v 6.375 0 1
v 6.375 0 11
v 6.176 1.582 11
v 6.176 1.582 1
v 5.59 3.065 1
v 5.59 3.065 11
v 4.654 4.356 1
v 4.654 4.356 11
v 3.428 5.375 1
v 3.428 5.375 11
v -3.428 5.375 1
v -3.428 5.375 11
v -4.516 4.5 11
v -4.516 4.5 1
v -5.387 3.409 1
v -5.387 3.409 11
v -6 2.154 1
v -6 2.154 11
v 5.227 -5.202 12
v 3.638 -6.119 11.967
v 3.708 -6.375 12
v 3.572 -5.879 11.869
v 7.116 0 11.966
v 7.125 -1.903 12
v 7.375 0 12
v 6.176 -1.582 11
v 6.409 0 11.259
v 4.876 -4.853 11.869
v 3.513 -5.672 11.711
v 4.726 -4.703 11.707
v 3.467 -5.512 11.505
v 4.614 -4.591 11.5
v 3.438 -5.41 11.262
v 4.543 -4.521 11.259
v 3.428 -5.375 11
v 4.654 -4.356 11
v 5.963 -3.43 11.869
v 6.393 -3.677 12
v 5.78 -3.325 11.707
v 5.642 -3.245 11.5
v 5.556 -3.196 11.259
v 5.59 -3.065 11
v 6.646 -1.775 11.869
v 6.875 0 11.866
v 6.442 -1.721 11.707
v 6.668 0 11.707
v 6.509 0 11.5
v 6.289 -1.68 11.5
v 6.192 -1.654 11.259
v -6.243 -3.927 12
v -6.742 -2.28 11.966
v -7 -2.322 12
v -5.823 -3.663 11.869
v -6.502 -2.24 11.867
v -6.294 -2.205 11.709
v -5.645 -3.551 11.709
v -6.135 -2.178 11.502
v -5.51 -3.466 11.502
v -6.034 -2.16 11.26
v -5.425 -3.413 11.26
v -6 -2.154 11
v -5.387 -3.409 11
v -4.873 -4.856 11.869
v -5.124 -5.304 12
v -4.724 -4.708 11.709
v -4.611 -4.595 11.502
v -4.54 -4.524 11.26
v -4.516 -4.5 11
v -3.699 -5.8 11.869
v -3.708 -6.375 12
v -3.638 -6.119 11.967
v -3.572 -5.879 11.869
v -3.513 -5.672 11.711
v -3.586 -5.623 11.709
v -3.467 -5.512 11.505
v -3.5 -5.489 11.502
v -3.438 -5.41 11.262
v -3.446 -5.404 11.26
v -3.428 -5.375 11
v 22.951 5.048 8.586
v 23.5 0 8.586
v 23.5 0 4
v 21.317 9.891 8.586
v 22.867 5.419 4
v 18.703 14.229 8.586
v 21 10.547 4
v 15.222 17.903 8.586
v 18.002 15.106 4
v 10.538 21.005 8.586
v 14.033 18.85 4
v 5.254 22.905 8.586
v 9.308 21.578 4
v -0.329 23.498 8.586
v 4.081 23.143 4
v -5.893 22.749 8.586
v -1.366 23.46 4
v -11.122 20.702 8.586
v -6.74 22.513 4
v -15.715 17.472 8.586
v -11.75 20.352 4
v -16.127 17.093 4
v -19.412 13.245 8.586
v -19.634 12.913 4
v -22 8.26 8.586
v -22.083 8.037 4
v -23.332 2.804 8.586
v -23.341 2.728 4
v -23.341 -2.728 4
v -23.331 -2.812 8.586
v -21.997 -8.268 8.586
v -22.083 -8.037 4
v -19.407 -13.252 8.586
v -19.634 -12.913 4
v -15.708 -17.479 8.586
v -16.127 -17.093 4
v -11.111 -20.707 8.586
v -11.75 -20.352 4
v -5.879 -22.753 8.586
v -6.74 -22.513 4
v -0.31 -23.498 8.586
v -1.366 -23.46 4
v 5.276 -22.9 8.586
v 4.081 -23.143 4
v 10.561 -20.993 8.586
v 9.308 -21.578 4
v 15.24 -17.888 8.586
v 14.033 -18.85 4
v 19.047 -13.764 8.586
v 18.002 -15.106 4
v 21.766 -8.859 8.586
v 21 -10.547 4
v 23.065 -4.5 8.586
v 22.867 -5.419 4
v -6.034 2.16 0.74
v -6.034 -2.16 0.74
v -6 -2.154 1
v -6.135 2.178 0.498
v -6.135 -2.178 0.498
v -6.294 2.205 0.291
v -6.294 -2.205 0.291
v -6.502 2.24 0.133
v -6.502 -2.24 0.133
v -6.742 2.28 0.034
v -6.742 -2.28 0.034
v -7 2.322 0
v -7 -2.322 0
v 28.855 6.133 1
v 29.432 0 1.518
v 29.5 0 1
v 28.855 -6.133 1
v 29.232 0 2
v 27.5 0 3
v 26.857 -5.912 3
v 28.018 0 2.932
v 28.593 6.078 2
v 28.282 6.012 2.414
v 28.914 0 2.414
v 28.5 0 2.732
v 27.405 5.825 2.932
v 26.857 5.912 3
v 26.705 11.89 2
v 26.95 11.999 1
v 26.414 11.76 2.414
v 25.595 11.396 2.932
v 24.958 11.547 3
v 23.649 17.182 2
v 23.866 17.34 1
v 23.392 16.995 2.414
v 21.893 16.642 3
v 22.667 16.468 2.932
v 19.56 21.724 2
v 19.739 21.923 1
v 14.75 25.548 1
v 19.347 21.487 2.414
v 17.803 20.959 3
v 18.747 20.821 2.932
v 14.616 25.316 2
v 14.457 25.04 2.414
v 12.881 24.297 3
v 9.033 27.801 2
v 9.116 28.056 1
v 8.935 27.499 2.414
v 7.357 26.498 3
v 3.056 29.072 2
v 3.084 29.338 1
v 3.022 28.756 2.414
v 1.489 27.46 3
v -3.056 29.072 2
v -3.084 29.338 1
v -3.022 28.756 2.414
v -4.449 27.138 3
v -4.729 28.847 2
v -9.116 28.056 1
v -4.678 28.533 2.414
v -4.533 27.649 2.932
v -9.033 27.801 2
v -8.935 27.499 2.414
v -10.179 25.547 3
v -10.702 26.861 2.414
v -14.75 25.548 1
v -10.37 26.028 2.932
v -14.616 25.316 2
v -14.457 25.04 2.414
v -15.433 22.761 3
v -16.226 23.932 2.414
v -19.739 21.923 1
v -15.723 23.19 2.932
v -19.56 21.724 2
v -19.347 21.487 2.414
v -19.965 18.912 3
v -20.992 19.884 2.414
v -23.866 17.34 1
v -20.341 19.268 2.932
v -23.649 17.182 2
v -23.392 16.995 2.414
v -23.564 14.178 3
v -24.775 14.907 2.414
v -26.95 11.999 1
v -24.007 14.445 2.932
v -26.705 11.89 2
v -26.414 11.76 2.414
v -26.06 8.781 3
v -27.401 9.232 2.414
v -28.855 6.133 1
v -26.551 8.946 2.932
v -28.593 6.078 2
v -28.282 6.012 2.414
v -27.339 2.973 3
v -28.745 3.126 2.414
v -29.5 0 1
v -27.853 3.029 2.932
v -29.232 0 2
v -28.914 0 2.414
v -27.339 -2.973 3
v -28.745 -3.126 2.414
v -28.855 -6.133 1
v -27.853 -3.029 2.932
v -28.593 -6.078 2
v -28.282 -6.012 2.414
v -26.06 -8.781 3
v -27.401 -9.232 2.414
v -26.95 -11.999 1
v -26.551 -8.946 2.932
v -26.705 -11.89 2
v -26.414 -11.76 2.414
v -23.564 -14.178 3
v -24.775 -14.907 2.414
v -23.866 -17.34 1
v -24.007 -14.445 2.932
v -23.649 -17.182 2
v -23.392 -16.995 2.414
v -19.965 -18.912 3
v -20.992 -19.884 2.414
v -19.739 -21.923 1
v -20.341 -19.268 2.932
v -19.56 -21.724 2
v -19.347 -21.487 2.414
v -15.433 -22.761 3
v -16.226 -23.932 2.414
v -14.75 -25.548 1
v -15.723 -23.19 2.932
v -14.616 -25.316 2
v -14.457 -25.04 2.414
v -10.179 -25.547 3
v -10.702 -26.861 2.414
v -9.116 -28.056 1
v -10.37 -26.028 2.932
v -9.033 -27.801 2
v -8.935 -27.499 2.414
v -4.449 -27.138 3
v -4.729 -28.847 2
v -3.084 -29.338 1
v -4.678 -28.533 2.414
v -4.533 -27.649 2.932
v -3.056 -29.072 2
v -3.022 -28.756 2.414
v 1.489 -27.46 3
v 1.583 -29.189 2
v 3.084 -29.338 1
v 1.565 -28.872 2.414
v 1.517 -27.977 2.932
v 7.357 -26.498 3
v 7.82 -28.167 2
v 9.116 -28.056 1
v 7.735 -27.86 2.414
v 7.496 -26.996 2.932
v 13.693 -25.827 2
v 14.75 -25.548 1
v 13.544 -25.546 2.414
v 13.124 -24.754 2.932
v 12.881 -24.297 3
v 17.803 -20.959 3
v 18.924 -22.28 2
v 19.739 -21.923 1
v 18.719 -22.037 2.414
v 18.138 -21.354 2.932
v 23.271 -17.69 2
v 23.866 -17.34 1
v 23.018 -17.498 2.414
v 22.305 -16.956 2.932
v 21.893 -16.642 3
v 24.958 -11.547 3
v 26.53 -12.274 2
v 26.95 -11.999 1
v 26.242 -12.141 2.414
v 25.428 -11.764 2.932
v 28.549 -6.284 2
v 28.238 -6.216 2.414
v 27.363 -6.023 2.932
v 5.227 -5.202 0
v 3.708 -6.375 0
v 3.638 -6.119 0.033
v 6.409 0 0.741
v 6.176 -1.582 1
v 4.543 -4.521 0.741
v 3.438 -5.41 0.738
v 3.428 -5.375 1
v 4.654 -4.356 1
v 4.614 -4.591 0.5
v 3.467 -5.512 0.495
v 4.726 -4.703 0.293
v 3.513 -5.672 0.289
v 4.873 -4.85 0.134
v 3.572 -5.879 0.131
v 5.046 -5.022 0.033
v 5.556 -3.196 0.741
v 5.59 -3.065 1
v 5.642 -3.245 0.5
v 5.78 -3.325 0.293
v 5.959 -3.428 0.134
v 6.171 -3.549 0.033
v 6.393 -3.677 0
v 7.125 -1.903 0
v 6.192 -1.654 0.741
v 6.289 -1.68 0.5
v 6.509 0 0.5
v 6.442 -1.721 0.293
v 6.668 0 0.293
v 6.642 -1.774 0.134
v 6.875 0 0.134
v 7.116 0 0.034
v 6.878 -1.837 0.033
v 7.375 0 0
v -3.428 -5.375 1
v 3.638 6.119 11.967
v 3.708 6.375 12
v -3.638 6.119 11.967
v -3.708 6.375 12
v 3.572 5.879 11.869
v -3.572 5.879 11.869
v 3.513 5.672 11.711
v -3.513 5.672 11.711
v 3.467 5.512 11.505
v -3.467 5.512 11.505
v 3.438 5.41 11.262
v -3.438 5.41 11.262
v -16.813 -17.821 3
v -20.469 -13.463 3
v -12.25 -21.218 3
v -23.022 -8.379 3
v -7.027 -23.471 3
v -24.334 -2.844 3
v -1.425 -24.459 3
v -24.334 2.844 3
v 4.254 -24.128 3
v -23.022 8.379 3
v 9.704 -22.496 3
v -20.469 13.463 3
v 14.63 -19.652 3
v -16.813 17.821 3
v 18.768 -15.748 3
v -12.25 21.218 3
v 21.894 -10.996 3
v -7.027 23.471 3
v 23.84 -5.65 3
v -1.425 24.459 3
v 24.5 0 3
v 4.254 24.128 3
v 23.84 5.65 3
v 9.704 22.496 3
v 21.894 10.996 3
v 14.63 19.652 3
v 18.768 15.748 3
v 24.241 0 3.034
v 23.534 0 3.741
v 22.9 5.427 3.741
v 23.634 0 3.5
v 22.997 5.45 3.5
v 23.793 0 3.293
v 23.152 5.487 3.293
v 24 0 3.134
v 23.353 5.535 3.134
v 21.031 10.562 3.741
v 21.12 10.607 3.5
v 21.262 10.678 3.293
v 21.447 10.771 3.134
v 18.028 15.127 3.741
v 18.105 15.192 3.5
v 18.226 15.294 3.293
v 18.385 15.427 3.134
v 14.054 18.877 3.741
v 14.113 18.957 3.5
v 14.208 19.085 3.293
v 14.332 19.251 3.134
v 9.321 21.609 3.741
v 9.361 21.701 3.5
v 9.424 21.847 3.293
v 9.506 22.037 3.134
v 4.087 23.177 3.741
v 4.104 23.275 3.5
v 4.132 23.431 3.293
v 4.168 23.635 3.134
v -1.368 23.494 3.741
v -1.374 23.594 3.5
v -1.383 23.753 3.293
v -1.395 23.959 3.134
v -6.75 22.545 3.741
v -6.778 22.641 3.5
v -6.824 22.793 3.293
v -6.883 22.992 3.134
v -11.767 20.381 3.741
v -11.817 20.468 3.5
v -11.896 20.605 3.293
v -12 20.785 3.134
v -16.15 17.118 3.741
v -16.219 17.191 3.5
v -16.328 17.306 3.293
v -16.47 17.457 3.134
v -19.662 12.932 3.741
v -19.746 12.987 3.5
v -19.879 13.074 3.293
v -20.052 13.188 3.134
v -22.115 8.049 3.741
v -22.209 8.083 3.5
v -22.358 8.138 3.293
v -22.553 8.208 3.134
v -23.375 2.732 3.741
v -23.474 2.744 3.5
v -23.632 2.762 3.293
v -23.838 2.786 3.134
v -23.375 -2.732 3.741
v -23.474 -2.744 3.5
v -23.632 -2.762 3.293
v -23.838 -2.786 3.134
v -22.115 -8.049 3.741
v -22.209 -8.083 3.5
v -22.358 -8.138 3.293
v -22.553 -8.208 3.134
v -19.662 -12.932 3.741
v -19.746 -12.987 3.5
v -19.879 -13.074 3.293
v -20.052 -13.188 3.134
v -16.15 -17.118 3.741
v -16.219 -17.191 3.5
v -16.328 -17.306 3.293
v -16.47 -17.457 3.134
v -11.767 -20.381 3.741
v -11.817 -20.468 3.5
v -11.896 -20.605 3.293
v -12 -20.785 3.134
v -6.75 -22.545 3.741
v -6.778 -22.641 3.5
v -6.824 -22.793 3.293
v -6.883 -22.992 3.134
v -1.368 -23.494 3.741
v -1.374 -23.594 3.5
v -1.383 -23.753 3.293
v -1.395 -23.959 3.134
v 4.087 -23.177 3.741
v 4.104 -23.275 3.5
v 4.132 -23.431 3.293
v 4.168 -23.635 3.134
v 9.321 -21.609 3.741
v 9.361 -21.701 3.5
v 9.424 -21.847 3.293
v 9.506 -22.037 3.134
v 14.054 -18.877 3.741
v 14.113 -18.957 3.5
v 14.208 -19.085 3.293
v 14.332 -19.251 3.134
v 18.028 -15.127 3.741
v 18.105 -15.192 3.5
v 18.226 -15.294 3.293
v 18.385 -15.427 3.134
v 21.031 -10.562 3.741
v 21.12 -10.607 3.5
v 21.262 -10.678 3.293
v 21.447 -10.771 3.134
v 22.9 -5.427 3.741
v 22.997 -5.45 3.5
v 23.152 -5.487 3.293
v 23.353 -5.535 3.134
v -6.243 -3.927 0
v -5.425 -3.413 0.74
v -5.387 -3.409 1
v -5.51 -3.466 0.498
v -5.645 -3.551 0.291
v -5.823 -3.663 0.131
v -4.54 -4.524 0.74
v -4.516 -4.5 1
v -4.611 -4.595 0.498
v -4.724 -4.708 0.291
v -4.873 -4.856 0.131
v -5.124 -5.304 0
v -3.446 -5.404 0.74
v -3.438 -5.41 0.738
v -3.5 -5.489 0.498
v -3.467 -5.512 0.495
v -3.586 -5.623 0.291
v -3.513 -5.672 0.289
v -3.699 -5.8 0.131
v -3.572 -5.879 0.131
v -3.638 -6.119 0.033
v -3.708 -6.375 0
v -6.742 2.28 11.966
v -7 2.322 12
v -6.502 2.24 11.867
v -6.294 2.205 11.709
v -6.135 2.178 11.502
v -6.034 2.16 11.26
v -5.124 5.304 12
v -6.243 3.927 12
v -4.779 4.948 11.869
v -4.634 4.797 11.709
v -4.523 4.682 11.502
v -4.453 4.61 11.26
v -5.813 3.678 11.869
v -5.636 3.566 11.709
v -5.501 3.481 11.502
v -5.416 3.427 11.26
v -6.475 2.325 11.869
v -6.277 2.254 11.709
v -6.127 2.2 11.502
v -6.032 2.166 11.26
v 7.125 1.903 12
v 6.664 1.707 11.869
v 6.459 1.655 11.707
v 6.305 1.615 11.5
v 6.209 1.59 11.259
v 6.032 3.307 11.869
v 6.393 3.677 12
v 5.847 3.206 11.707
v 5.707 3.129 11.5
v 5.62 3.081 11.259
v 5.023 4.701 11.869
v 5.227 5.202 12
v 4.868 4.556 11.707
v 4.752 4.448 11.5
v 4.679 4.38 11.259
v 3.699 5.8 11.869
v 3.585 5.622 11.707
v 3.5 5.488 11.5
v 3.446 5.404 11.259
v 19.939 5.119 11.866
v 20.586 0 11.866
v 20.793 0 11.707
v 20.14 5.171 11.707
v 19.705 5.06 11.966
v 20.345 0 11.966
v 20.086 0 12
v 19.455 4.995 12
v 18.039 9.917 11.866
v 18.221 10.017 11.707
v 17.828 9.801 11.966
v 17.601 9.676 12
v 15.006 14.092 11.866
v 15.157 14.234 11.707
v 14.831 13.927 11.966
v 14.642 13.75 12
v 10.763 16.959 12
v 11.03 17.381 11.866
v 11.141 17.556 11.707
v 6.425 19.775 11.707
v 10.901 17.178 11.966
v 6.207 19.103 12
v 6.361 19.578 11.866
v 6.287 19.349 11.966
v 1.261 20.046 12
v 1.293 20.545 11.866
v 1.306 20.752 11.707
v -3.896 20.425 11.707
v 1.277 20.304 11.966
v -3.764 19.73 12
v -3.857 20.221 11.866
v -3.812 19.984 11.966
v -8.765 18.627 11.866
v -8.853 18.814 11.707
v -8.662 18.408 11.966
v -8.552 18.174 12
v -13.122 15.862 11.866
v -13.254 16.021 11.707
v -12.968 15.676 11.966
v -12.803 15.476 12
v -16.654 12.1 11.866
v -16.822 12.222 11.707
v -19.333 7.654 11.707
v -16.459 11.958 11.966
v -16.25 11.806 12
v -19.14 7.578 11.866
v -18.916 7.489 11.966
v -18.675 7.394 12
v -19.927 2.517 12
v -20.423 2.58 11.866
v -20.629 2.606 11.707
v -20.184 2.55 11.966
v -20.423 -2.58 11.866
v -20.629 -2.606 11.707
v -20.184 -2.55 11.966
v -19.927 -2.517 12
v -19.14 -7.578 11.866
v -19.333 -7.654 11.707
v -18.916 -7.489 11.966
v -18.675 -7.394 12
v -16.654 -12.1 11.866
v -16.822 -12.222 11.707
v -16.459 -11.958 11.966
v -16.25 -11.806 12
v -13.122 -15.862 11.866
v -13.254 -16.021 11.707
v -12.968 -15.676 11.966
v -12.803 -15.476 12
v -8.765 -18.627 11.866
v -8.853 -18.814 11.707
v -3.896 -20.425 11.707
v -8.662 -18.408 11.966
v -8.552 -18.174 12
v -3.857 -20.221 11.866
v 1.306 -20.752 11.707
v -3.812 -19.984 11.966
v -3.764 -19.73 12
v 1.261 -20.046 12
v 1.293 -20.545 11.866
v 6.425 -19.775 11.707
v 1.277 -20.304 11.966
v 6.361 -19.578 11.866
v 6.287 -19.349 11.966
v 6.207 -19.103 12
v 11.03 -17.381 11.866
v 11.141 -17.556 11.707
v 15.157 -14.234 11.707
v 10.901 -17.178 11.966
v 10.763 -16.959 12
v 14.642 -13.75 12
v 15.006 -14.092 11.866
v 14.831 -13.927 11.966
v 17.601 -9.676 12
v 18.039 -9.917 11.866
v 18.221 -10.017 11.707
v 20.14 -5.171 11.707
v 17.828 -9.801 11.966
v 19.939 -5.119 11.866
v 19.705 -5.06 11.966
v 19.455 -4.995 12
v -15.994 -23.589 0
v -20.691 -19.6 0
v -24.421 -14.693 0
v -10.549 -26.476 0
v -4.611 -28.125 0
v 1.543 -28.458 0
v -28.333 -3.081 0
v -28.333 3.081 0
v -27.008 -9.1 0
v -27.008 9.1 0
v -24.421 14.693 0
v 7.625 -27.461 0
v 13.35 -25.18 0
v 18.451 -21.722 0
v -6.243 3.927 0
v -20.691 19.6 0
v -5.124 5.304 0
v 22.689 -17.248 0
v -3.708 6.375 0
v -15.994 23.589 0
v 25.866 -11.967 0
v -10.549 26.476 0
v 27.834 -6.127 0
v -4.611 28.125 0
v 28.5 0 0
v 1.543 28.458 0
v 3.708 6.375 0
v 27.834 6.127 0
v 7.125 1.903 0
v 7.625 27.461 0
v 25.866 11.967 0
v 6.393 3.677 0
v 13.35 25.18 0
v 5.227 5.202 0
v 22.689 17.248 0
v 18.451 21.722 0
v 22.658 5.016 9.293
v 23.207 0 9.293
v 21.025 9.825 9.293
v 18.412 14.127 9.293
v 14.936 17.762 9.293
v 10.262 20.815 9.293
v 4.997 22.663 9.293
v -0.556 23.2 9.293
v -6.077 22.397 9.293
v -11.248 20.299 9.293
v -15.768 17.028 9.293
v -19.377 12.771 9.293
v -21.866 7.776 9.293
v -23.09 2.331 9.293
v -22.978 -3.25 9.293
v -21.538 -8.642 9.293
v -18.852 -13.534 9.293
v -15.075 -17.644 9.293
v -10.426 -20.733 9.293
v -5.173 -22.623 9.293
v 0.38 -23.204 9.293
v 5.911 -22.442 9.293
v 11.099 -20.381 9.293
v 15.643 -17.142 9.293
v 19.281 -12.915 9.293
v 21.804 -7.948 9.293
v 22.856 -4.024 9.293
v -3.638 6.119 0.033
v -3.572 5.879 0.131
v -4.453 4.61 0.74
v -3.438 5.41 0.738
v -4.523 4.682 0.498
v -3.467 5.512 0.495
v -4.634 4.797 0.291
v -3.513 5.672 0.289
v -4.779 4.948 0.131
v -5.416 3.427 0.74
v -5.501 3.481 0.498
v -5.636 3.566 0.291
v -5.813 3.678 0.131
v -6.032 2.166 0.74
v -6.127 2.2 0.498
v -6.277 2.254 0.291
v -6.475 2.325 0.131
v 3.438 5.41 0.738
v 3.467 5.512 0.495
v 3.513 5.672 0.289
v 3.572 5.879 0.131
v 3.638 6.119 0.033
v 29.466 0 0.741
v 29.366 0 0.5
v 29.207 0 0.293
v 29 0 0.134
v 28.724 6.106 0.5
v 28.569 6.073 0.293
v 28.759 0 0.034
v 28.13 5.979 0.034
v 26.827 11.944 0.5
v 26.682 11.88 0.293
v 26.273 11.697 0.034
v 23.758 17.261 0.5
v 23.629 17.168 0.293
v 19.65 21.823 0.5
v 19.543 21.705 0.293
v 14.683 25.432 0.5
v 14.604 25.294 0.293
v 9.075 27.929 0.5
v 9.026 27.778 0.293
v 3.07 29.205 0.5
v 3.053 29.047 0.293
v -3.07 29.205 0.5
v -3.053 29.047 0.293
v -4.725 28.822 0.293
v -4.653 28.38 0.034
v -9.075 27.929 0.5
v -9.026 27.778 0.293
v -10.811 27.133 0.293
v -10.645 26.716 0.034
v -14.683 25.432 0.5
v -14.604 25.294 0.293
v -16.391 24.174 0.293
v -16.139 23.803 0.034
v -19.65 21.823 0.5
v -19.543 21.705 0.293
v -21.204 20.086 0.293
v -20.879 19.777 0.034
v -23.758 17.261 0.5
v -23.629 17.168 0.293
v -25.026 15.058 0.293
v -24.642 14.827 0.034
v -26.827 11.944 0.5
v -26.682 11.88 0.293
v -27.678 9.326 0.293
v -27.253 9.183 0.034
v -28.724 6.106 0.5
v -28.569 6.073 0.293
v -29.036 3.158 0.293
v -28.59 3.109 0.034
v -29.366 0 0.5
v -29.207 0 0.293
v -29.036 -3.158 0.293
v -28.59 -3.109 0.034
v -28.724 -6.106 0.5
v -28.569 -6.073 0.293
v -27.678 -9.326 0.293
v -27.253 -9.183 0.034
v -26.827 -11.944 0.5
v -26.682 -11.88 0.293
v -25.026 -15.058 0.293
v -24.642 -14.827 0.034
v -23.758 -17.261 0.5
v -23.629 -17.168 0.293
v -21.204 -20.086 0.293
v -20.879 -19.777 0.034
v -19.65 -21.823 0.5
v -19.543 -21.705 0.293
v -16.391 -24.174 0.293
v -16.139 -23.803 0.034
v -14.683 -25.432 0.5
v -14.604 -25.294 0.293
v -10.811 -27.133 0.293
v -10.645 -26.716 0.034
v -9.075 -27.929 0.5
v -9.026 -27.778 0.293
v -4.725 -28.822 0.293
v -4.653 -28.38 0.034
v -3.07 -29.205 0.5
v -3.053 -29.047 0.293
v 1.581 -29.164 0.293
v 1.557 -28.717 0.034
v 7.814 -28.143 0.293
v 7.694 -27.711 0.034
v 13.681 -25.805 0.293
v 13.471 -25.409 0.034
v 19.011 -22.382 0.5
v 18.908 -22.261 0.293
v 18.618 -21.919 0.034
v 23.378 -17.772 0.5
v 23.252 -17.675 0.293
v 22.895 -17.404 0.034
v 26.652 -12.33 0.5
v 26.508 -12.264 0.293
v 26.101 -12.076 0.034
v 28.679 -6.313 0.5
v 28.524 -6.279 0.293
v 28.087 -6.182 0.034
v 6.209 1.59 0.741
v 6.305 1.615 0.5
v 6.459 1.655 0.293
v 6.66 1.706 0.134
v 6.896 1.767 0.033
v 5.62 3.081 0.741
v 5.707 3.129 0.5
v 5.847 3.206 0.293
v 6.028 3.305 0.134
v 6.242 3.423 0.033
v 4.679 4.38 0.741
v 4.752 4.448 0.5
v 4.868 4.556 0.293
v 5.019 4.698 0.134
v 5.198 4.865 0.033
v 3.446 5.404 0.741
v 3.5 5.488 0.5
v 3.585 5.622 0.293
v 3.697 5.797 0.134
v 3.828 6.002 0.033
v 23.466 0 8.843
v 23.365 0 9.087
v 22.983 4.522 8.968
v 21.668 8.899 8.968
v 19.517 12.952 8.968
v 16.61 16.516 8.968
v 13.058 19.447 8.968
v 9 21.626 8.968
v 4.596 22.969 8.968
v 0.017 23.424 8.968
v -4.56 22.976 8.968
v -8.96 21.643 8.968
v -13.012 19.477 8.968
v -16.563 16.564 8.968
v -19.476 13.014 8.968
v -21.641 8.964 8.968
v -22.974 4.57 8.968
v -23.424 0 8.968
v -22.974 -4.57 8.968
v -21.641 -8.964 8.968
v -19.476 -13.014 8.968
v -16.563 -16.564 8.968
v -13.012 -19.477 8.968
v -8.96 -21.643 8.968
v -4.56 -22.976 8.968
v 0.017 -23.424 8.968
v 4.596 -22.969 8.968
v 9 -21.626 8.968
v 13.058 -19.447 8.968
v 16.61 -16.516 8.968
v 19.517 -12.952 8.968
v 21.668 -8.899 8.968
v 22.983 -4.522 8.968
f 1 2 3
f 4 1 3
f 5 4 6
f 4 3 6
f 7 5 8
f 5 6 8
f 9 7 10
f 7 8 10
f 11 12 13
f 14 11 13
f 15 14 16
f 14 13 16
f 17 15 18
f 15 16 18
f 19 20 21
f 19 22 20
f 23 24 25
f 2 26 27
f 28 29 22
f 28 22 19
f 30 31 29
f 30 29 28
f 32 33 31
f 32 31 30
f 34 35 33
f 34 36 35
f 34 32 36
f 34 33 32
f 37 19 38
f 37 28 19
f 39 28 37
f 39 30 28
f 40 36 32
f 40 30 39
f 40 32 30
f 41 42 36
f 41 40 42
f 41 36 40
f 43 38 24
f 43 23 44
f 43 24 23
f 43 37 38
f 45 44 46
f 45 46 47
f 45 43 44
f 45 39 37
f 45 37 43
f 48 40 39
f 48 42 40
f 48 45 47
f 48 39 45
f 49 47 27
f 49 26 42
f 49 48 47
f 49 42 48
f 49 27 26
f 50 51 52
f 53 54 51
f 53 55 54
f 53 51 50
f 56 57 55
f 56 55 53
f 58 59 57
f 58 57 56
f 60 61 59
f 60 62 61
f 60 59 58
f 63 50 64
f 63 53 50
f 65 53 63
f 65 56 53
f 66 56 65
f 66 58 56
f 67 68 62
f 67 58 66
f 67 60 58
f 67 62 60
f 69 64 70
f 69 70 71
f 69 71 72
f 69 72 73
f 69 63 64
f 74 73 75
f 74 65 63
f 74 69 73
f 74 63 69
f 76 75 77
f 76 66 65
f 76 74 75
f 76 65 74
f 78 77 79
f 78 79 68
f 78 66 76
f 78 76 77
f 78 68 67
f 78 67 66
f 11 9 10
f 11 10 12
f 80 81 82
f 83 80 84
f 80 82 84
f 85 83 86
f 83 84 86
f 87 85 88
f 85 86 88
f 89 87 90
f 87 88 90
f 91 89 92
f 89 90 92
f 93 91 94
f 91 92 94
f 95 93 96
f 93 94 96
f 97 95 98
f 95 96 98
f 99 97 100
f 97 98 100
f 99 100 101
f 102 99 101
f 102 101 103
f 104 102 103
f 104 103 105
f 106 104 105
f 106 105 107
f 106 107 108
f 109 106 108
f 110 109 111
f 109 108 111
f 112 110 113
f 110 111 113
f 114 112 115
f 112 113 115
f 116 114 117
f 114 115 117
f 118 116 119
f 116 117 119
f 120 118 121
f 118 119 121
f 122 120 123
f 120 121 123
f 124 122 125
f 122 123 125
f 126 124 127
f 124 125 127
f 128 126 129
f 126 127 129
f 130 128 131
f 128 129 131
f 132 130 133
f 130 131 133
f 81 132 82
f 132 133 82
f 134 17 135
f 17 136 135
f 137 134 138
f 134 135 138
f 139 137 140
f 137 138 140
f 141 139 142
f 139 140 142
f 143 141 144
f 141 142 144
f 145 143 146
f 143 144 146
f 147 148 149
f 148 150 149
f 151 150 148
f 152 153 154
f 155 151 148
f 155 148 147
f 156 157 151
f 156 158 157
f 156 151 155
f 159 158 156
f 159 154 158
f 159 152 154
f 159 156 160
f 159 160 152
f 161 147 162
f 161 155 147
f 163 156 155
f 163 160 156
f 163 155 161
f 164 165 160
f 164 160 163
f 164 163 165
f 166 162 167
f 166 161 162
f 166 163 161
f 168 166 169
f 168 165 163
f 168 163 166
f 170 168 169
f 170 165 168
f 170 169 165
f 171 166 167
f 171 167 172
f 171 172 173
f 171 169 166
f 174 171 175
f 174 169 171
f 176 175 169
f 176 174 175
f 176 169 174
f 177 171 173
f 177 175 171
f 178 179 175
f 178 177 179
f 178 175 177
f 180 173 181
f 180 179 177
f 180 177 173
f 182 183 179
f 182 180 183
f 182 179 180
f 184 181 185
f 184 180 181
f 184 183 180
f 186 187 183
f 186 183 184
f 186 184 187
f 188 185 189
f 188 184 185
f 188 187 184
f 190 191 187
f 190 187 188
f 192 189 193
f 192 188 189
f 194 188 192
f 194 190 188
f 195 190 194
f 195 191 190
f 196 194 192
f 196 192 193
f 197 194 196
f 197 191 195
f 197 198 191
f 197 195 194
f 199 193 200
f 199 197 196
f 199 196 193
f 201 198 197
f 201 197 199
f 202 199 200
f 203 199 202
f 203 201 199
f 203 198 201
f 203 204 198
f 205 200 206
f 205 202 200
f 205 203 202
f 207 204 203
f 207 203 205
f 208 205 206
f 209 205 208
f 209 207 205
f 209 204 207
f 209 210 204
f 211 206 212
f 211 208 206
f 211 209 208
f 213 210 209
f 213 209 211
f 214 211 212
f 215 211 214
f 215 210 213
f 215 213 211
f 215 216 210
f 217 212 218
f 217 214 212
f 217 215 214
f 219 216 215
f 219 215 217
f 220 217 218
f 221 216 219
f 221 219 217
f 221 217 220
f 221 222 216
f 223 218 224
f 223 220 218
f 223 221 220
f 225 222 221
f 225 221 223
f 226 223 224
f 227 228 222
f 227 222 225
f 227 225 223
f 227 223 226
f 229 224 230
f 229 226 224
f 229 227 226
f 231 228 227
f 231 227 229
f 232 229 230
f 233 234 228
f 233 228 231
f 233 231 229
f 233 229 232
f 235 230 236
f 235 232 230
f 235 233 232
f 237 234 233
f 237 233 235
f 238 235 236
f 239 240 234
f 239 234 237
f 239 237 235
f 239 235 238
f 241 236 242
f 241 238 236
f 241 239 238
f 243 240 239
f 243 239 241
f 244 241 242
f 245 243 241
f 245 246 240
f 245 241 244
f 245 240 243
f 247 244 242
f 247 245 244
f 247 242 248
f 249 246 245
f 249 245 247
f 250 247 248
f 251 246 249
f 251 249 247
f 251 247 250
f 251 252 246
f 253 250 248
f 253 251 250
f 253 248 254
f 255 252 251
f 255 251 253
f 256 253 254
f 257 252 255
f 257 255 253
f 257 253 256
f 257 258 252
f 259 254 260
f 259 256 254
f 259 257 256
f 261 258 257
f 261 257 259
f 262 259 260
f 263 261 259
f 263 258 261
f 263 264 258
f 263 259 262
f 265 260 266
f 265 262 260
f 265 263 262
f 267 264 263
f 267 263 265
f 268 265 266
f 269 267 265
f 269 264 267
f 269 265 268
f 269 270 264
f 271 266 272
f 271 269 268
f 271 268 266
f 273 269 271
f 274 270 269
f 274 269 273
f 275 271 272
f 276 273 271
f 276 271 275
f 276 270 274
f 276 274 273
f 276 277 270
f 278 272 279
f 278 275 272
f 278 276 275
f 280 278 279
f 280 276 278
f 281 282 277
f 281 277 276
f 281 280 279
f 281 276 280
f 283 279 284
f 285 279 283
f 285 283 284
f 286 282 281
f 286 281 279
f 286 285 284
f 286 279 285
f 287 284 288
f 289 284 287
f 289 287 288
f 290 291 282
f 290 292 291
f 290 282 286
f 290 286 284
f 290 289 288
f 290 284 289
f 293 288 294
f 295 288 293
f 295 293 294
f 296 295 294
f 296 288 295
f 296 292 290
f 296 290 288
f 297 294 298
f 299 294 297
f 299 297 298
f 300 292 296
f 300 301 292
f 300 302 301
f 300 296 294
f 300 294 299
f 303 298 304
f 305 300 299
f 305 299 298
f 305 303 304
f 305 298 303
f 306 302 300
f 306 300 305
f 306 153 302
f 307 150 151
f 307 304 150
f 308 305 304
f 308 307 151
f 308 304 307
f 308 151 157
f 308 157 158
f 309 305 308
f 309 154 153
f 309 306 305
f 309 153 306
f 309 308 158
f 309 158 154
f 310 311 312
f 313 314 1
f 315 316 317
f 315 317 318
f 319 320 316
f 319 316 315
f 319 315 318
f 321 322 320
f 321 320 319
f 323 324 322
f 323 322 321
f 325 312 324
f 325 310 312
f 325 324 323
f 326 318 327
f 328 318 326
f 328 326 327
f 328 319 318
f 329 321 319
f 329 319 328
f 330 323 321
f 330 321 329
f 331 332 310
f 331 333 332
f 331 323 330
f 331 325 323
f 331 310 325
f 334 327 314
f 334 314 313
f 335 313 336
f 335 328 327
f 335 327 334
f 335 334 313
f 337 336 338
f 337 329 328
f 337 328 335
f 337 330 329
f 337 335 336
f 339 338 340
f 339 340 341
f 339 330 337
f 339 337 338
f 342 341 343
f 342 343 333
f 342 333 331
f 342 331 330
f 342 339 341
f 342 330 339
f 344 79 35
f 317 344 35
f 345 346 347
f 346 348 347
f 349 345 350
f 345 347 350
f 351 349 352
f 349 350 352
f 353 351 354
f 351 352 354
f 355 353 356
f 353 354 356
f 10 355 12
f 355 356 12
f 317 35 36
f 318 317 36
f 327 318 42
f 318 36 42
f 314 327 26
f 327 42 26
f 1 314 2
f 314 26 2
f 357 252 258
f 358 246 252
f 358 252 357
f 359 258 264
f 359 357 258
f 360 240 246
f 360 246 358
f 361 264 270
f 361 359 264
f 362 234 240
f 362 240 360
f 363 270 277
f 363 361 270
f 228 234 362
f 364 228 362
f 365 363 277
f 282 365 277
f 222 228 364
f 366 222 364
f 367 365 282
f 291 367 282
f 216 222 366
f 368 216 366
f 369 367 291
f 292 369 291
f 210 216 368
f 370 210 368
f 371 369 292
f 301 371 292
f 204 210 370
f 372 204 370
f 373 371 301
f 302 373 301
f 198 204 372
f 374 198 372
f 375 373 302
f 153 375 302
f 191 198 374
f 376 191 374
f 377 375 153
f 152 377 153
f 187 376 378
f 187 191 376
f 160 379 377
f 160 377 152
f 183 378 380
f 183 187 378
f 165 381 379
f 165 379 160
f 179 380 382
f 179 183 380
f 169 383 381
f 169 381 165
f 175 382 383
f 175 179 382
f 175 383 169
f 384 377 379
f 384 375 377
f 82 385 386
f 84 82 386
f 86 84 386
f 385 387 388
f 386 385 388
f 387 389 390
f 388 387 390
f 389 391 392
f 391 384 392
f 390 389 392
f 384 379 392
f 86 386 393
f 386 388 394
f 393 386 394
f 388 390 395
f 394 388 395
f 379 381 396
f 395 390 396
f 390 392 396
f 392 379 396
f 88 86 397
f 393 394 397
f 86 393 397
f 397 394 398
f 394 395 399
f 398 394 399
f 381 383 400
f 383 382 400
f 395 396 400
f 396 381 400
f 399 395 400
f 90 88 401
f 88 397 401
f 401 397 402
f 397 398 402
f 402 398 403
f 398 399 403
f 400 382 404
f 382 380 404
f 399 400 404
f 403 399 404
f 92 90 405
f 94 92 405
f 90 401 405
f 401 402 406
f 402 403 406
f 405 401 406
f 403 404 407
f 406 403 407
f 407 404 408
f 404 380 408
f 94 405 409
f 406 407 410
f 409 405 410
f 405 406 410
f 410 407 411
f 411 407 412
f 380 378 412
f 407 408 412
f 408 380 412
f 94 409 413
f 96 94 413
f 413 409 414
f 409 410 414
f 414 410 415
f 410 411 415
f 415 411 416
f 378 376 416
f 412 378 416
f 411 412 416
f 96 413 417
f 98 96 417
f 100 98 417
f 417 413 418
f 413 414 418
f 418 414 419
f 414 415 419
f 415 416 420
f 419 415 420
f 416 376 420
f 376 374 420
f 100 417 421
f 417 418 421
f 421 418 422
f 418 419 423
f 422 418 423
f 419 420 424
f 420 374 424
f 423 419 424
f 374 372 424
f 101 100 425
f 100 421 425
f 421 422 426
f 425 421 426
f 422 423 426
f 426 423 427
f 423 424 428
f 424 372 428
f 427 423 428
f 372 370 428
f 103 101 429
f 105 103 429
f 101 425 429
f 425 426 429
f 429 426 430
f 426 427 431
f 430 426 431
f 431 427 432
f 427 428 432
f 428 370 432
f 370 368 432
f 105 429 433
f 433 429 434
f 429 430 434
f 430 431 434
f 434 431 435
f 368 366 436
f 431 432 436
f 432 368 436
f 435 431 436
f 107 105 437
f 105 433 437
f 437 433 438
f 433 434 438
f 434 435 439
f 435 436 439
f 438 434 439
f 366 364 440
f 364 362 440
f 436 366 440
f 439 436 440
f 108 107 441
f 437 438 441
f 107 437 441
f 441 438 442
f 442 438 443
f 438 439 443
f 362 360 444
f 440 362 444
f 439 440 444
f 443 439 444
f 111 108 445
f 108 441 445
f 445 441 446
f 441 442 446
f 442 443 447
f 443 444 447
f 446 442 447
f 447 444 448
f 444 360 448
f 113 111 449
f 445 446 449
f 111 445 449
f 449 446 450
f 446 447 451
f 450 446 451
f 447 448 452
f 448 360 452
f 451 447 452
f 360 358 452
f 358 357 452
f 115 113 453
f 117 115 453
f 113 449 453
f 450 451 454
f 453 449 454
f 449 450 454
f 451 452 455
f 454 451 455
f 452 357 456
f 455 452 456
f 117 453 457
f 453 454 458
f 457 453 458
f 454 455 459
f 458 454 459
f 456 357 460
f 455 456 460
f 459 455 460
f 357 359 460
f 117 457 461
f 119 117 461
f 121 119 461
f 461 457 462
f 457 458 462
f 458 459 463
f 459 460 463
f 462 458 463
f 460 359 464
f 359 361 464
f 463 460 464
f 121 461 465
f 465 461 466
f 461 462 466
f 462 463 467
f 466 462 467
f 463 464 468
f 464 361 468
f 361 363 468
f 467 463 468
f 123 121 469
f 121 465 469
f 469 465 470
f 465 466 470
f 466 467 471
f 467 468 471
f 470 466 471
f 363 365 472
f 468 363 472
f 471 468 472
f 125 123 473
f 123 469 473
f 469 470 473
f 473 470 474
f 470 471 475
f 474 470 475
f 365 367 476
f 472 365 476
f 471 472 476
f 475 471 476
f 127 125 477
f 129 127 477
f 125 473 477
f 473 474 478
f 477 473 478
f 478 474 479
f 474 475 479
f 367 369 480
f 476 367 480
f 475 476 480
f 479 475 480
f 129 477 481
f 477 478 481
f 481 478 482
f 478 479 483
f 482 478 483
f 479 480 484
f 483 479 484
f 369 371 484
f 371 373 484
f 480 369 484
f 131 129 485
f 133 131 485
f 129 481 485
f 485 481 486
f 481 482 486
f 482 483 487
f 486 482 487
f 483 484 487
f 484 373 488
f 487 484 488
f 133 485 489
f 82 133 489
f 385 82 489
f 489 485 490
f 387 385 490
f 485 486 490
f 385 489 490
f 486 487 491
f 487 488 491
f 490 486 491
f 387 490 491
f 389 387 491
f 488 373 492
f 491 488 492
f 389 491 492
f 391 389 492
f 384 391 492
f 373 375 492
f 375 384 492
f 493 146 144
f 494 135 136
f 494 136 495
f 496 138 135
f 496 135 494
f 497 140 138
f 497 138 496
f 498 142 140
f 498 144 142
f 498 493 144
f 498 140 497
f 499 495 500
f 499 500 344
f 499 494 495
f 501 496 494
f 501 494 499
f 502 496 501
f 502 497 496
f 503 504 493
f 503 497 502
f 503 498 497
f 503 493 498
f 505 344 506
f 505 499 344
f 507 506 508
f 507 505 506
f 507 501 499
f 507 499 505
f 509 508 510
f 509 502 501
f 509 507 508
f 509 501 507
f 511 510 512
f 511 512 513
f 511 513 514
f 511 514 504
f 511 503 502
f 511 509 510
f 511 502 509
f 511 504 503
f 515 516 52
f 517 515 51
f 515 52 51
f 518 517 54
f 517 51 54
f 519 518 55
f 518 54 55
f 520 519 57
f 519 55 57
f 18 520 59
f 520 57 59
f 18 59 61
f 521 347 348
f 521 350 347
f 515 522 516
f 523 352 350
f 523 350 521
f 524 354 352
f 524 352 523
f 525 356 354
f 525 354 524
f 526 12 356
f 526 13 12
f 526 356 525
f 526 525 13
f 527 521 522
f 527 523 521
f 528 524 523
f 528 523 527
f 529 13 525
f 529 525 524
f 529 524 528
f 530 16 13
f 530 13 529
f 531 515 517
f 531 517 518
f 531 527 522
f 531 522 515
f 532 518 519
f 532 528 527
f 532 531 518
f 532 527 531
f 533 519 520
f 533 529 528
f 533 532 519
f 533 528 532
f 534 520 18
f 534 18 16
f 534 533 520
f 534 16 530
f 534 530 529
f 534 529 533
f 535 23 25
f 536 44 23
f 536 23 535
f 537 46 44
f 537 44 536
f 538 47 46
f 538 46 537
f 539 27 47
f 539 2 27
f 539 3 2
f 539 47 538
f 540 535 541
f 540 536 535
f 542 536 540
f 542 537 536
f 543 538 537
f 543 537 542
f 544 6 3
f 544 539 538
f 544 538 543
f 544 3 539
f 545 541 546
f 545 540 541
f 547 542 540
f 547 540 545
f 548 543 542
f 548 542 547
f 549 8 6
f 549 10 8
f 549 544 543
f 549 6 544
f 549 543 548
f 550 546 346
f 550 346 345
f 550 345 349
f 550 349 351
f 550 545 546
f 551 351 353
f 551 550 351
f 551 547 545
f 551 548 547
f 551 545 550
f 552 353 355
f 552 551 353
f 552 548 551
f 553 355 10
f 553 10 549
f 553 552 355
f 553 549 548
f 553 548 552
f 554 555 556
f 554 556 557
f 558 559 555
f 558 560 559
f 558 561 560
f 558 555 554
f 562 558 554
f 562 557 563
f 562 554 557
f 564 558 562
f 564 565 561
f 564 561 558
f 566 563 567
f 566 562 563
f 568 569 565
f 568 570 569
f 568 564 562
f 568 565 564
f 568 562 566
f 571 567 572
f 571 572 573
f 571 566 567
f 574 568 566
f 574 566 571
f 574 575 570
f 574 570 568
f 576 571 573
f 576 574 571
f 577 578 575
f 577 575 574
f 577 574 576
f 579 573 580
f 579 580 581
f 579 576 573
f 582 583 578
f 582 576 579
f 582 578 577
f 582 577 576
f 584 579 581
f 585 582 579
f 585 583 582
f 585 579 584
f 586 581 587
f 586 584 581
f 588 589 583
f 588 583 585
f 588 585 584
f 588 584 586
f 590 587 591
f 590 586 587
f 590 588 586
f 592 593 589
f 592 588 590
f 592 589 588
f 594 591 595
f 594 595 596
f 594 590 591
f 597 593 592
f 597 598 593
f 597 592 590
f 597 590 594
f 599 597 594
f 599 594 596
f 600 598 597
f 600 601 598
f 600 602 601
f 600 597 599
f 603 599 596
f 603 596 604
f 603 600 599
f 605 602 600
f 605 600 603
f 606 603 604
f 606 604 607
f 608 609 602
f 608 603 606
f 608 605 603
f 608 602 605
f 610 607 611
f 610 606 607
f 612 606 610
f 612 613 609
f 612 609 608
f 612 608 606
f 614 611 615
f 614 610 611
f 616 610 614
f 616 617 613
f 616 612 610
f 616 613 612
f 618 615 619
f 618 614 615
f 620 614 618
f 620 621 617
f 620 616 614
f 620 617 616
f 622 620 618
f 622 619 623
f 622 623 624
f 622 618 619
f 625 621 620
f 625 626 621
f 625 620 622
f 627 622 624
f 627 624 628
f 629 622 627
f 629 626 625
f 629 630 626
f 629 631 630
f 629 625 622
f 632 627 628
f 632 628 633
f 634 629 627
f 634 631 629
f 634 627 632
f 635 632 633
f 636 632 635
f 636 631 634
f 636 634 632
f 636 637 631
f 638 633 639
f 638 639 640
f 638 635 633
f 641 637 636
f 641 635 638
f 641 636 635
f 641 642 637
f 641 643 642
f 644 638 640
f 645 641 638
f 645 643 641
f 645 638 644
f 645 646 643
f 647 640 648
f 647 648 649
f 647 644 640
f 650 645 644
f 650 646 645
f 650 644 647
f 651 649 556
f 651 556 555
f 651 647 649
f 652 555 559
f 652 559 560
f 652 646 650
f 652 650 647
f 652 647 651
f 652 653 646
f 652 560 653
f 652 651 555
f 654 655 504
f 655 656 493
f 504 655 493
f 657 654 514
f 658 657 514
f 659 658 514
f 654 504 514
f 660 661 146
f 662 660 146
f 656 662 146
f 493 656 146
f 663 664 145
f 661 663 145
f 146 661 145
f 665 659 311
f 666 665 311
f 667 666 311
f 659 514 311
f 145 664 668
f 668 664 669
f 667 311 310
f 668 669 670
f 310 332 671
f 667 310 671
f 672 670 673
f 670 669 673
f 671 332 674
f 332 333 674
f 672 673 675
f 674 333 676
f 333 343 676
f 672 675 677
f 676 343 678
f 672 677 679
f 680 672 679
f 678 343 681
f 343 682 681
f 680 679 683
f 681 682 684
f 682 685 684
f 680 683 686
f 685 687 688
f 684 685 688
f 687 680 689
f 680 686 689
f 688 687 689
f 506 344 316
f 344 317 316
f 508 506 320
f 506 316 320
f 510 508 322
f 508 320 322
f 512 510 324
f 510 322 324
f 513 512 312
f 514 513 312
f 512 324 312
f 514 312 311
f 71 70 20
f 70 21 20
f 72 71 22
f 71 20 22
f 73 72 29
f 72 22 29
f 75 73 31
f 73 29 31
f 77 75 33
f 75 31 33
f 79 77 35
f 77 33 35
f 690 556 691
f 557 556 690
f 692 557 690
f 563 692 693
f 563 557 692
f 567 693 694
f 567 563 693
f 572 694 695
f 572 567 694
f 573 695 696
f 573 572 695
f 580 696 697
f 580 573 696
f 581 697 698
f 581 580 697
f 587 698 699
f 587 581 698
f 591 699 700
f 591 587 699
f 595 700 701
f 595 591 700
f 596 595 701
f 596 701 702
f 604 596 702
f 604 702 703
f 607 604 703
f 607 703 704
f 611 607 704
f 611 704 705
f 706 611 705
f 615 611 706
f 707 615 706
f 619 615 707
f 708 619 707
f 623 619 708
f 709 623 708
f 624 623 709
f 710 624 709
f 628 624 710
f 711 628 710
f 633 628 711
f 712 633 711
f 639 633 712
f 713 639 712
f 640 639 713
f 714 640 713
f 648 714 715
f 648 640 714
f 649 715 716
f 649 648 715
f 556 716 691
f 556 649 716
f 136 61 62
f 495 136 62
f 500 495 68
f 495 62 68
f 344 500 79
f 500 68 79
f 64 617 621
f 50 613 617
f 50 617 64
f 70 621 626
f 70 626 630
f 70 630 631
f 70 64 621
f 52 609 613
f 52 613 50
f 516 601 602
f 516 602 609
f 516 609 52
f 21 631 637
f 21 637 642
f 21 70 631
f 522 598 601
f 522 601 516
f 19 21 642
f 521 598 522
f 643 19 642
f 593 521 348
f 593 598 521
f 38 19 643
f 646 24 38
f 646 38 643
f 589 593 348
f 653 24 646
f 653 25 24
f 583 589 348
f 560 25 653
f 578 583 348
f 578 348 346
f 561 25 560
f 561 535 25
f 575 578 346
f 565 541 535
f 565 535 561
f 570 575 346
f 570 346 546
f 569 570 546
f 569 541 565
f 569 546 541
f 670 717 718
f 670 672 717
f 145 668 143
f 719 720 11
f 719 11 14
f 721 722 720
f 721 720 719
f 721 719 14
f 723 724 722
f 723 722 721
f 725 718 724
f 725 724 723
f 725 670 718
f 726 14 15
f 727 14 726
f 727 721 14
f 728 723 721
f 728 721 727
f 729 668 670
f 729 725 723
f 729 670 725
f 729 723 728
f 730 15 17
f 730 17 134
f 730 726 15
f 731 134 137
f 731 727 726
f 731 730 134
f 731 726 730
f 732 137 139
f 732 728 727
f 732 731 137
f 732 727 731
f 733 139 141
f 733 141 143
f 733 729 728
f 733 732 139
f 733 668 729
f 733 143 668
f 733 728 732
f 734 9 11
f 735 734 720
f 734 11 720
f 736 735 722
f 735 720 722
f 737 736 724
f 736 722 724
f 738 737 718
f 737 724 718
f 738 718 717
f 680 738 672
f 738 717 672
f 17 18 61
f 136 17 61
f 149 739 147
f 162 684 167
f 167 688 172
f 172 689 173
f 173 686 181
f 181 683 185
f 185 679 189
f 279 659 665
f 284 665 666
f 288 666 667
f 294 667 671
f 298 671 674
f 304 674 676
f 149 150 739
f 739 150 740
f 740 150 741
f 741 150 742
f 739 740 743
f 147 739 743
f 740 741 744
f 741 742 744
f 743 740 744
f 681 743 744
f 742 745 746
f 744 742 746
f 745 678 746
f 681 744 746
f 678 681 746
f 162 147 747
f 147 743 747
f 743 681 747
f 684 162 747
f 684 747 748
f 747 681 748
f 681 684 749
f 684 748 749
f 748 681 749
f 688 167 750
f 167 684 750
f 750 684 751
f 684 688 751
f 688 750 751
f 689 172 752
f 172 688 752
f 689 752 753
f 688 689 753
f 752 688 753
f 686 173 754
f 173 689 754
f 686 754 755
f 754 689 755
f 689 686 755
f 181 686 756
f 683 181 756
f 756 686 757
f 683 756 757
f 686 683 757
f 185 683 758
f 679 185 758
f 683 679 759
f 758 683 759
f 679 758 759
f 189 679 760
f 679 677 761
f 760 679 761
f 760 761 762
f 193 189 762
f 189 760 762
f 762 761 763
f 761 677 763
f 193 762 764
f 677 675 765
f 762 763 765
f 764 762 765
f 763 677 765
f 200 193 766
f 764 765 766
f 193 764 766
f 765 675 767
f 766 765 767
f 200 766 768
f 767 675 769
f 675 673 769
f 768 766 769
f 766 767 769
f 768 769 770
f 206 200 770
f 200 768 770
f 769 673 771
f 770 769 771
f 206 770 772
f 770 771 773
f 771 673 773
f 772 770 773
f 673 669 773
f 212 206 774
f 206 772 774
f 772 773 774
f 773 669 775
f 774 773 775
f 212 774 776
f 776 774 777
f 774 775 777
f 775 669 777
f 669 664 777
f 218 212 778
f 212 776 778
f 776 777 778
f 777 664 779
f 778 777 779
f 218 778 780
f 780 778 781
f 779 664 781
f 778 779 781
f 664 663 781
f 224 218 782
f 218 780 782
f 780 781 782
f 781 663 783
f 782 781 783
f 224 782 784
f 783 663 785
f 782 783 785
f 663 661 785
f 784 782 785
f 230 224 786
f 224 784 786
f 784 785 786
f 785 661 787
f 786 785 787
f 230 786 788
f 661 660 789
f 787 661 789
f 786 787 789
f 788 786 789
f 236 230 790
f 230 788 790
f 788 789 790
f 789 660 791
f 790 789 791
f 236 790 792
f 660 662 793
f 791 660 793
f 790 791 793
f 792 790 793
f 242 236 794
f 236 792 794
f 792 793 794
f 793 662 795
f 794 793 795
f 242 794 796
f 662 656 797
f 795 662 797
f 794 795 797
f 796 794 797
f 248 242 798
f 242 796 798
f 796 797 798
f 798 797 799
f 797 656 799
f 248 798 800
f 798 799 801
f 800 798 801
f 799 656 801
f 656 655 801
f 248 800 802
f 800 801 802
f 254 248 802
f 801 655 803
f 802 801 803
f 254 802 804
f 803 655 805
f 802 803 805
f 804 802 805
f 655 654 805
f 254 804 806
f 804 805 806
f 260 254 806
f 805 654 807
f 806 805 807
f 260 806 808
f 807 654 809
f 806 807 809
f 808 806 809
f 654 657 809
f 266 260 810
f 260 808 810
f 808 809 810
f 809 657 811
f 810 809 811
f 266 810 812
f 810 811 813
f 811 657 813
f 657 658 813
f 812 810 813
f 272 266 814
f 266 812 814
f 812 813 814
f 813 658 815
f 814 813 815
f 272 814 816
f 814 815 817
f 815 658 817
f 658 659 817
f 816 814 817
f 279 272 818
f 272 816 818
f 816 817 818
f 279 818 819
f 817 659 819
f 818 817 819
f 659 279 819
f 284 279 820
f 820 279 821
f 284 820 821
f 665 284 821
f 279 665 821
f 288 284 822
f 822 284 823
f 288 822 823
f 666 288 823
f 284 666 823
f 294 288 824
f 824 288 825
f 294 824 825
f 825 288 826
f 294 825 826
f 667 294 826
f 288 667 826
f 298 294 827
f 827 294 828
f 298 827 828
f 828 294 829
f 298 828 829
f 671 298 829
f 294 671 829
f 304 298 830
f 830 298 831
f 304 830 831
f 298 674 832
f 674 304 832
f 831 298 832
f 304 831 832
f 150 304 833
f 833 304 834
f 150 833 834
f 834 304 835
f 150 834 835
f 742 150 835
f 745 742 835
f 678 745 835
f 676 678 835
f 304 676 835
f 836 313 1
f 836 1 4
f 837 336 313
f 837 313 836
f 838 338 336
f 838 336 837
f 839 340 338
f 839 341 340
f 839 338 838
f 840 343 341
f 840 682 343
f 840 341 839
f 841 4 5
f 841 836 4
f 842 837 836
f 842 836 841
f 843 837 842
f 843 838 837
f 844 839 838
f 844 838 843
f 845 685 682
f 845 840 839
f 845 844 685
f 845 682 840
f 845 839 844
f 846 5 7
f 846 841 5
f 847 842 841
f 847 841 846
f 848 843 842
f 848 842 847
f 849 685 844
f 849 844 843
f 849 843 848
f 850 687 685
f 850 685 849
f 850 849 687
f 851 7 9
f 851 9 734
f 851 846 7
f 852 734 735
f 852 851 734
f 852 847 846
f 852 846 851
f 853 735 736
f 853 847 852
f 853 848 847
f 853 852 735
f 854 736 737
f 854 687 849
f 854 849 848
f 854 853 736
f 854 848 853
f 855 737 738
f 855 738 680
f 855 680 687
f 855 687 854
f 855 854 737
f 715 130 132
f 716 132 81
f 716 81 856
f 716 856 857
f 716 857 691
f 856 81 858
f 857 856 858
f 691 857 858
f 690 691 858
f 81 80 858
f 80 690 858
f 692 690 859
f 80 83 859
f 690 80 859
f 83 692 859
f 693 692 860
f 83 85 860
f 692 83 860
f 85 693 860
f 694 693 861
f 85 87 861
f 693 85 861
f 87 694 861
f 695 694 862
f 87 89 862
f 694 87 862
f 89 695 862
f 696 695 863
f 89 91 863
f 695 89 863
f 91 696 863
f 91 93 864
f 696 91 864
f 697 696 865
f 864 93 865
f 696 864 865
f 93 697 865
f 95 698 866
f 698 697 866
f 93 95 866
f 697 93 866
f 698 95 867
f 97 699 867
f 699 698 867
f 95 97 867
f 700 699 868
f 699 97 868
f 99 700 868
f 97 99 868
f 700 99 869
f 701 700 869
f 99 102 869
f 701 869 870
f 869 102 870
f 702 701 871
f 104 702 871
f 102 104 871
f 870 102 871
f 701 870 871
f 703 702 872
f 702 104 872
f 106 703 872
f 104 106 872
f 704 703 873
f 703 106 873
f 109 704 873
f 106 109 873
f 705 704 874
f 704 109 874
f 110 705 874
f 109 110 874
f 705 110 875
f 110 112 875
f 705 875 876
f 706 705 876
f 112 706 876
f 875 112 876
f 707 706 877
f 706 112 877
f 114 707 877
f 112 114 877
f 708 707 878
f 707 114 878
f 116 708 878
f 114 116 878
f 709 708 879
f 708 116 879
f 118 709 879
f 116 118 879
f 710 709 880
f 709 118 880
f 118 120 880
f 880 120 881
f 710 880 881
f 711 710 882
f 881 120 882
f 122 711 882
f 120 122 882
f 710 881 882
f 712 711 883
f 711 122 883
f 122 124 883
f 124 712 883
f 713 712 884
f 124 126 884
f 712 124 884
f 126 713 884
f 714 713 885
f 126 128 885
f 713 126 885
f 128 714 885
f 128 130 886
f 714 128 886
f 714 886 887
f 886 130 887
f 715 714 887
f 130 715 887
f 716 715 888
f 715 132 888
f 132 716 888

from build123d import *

# Parameters (mm, degrees)
SKETCH1_R           = 29.5
BOSS_EXTRUDE1_DEPTH = 3
SKETCH2_R           = 23.5
BOSS_EXTRUDE2_DEPTH = 9
CUT_EXTRUDE1_DEPTH  = 44.410828142
FILLET1_R           = 2
CHAMFER1_SIZE       = 3
FILLET2_R           = 1
FILLET3_R           = 1


with BuildPart() as part:
    # Sketch1 → Boss-Extrude1 (new body)
    with BuildSketch(Plane.XY):
        Circle(SKETCH1_R)
    extrude(amount=BOSS_EXTRUDE1_DEPTH)

    # Sketch2 → Boss-Extrude2 (add)
    with BuildSketch(Plane.XY.offset(3)):
        Circle(SKETCH2_R)
    extrude(amount=BOSS_EXTRUDE2_DEPTH)

    # Sketch3 → Cut-Extrude1 (cut, through all)
    with BuildSketch(Plane.XY.offset(12)):
        with BuildLine():
            ThreePointArc((6.375, 0), (5.589857961, 3.064981726), (3.4278273, 5.375))
            Line((3.4278273, 5.375), (-3.4278273, 5.375))
            ThreePointArc((-3.4278273, 5.375), (-4.981400642, 3.97822481), (-6, 2.154210992))
            Line((-6, 2.154210992), (-6, -2.154210992))
            ThreePointArc((-6, -2.154210992), (-4.981400642, -3.97822481), (-3.4278273, -5.375))
            Line((-3.4278273, -5.375), (3.4278273, -5.375))
            ThreePointArc((3.4278273, -5.375), (5.589857961, -3.064981726), (6.375, 0))
        make_face()
    extrude(amount=-CUT_EXTRUDE1_DEPTH, mode=Mode.SUBTRACT)

    # Fillet1
    fillet1_edges = [part.edges().sort_by_distance(p)[0] for p in [
        (-29.5, 0, 3),
    ]]
    fillet(fillet1_edges, radius=FILLET1_R)

    # Chamfer1
    chamfer1_edges = [part.edges().sort_by_distance(p)[0] for p in [
        (-23.5, 0, 12),
    ]]
    chamfer(chamfer1_edges, length=CHAMFER1_SIZE)

    # Fillet2
    fillet2_edges = [part.edges().sort_by_distance(p)[0] for p in [
        (0, 5.375, 0),
        (6.375, 0, 0),
        (0, -5.375, 12),
        (-4.981400642, -3.97822481, 0),
        (-6, 0, 0),
        (-4.981400642, 3.97822481, 0),
        (0, -5.375, 0),
        (0, 5.375, 12),
        (-29.5, 0, 0),
        (-4.981400642, 3.97822481, 12),
        (-6, 0, 12),
        (-4.981400642, -3.97822481, 12),
        (6.375, 0, 12),
        (-20.5, 0, 12),
        (-23.5, 0, 9),
    ]]
    fillet(fillet2_edges, radius=FILLET2_R - 0.0001)  # a hair under: the kernel refuses the full size

    # Fillet3
    fillet3_edges = [part.edges().sort_by_distance(p)[0] for p in [
        (-23.5, 0, 3),
    ]]
    fillet(fillet3_edges, radius=FILLET3_R)


solid = part.part
